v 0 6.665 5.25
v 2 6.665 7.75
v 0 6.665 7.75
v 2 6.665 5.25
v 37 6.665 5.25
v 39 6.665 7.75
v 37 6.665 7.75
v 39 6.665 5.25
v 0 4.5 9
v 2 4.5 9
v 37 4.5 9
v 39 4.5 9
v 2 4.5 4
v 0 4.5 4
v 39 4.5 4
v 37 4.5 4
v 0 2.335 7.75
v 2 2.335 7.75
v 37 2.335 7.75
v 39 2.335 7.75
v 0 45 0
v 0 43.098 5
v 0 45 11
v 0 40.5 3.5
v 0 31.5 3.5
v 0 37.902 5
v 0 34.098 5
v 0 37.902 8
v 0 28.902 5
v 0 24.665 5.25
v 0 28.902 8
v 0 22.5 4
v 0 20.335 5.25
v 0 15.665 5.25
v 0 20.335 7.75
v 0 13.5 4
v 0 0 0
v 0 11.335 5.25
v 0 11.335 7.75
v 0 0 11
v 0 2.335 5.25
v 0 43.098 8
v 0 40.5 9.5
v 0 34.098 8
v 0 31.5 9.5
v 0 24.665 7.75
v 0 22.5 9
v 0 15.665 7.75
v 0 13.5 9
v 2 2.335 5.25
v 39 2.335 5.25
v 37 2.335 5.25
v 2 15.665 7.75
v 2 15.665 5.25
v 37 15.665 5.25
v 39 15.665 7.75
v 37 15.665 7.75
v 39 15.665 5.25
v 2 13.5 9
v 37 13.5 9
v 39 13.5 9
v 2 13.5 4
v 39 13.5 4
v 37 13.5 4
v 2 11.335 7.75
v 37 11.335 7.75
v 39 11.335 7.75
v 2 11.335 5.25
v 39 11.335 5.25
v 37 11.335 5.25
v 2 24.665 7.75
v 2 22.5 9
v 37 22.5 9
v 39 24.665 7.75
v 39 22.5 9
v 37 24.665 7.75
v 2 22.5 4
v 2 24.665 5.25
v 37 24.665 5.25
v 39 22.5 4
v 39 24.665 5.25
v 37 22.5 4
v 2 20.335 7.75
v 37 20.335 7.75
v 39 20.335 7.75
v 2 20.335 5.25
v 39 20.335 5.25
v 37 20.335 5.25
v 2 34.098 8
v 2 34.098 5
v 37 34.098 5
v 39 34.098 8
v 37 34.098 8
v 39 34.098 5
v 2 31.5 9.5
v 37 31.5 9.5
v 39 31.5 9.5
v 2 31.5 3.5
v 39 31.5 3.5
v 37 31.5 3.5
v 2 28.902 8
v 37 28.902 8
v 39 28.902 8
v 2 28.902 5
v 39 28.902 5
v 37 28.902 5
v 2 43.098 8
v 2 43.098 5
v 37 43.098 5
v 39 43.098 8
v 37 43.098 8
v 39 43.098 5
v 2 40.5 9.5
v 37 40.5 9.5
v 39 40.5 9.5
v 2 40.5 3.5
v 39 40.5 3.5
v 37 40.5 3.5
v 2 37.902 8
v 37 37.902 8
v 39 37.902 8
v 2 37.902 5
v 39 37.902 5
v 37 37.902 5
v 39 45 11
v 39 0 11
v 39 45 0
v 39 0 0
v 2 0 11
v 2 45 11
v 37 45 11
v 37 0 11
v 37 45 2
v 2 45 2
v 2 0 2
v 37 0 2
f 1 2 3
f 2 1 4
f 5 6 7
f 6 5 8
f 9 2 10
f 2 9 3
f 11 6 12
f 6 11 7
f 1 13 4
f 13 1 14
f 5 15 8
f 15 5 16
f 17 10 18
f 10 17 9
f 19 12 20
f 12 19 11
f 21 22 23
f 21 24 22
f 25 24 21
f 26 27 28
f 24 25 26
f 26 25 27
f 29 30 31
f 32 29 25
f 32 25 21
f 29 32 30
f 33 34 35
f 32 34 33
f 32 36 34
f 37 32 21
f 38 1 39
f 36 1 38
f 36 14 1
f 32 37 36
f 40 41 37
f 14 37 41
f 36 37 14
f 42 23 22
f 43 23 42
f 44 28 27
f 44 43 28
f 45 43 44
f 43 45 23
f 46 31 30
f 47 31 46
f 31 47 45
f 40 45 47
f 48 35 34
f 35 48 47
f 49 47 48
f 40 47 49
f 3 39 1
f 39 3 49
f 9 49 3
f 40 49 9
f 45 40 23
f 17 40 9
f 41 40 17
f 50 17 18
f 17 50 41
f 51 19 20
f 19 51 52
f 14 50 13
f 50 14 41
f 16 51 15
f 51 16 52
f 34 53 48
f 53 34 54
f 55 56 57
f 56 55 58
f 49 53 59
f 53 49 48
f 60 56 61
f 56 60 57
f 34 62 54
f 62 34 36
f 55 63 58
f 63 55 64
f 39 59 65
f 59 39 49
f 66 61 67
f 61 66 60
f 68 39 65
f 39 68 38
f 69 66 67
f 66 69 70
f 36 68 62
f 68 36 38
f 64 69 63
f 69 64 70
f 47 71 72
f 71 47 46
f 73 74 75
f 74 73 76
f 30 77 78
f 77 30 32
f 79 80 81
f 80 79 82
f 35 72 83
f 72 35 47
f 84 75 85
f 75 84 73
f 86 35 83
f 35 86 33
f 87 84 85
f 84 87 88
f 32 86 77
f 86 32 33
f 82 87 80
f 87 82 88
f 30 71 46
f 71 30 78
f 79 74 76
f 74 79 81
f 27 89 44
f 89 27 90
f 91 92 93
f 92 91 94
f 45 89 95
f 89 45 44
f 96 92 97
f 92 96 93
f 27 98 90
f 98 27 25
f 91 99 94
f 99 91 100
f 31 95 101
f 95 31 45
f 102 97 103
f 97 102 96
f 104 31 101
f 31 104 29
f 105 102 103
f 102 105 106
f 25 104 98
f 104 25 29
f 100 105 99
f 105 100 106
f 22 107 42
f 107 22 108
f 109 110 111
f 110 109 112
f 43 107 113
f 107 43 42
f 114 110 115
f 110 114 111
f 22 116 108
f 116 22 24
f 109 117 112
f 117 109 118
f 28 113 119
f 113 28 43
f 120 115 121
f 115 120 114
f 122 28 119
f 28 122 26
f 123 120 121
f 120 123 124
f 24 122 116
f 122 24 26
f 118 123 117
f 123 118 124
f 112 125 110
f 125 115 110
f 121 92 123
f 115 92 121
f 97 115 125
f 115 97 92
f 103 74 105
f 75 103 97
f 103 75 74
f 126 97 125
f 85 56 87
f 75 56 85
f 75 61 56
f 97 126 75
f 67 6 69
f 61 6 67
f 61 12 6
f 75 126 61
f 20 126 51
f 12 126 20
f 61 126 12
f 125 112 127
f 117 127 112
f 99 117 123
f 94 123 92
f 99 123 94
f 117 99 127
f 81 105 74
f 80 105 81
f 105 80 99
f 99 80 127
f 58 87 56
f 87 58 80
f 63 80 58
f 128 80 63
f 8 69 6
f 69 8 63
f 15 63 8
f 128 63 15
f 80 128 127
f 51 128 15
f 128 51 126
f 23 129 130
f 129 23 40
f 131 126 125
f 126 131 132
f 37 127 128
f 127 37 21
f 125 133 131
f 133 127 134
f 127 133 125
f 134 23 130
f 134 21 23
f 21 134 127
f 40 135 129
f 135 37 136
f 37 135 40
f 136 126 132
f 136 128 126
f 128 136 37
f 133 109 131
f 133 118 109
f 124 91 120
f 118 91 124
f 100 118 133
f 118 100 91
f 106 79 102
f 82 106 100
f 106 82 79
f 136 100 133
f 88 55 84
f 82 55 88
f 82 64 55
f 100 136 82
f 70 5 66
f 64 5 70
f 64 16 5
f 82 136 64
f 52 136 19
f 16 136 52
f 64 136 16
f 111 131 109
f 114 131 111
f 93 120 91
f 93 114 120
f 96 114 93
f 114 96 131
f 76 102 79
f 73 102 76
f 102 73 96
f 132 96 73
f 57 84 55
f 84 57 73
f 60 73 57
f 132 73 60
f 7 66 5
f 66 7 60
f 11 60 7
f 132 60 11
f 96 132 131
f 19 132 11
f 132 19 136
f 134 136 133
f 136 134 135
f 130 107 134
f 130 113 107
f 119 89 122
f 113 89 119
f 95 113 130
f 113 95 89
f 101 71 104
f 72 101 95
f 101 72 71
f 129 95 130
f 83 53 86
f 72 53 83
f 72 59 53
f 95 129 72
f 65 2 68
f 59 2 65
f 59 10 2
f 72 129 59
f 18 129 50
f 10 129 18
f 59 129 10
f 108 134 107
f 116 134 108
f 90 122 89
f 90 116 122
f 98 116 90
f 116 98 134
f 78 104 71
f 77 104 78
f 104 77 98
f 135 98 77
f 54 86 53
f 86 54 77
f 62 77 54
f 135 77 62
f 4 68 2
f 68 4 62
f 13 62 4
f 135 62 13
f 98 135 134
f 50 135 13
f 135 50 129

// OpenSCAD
step = 9;
diams = [4, 4, 4, 5, 5]; // spare big ones
//diams = [1, 1.5, 2, 2.5, 3, 4, 5]; // regular set
n = len(diams);
h = 35;
t = 2;
eps = 0.5;

difference(){
    cube([h + t*2, step*n, step + t]);
    translate([t, 0, t])
    cube([h, step*n, step]);
    for (i = [0:len(diams) - 1]){
        rad = diams[i]/2 + eps;
        translate([0, step/2 + i*step, step/2 + t])
        rotate([0, 90, 0])
        cylinder(2*h, rad, rad, $fn=6);
    }
}
